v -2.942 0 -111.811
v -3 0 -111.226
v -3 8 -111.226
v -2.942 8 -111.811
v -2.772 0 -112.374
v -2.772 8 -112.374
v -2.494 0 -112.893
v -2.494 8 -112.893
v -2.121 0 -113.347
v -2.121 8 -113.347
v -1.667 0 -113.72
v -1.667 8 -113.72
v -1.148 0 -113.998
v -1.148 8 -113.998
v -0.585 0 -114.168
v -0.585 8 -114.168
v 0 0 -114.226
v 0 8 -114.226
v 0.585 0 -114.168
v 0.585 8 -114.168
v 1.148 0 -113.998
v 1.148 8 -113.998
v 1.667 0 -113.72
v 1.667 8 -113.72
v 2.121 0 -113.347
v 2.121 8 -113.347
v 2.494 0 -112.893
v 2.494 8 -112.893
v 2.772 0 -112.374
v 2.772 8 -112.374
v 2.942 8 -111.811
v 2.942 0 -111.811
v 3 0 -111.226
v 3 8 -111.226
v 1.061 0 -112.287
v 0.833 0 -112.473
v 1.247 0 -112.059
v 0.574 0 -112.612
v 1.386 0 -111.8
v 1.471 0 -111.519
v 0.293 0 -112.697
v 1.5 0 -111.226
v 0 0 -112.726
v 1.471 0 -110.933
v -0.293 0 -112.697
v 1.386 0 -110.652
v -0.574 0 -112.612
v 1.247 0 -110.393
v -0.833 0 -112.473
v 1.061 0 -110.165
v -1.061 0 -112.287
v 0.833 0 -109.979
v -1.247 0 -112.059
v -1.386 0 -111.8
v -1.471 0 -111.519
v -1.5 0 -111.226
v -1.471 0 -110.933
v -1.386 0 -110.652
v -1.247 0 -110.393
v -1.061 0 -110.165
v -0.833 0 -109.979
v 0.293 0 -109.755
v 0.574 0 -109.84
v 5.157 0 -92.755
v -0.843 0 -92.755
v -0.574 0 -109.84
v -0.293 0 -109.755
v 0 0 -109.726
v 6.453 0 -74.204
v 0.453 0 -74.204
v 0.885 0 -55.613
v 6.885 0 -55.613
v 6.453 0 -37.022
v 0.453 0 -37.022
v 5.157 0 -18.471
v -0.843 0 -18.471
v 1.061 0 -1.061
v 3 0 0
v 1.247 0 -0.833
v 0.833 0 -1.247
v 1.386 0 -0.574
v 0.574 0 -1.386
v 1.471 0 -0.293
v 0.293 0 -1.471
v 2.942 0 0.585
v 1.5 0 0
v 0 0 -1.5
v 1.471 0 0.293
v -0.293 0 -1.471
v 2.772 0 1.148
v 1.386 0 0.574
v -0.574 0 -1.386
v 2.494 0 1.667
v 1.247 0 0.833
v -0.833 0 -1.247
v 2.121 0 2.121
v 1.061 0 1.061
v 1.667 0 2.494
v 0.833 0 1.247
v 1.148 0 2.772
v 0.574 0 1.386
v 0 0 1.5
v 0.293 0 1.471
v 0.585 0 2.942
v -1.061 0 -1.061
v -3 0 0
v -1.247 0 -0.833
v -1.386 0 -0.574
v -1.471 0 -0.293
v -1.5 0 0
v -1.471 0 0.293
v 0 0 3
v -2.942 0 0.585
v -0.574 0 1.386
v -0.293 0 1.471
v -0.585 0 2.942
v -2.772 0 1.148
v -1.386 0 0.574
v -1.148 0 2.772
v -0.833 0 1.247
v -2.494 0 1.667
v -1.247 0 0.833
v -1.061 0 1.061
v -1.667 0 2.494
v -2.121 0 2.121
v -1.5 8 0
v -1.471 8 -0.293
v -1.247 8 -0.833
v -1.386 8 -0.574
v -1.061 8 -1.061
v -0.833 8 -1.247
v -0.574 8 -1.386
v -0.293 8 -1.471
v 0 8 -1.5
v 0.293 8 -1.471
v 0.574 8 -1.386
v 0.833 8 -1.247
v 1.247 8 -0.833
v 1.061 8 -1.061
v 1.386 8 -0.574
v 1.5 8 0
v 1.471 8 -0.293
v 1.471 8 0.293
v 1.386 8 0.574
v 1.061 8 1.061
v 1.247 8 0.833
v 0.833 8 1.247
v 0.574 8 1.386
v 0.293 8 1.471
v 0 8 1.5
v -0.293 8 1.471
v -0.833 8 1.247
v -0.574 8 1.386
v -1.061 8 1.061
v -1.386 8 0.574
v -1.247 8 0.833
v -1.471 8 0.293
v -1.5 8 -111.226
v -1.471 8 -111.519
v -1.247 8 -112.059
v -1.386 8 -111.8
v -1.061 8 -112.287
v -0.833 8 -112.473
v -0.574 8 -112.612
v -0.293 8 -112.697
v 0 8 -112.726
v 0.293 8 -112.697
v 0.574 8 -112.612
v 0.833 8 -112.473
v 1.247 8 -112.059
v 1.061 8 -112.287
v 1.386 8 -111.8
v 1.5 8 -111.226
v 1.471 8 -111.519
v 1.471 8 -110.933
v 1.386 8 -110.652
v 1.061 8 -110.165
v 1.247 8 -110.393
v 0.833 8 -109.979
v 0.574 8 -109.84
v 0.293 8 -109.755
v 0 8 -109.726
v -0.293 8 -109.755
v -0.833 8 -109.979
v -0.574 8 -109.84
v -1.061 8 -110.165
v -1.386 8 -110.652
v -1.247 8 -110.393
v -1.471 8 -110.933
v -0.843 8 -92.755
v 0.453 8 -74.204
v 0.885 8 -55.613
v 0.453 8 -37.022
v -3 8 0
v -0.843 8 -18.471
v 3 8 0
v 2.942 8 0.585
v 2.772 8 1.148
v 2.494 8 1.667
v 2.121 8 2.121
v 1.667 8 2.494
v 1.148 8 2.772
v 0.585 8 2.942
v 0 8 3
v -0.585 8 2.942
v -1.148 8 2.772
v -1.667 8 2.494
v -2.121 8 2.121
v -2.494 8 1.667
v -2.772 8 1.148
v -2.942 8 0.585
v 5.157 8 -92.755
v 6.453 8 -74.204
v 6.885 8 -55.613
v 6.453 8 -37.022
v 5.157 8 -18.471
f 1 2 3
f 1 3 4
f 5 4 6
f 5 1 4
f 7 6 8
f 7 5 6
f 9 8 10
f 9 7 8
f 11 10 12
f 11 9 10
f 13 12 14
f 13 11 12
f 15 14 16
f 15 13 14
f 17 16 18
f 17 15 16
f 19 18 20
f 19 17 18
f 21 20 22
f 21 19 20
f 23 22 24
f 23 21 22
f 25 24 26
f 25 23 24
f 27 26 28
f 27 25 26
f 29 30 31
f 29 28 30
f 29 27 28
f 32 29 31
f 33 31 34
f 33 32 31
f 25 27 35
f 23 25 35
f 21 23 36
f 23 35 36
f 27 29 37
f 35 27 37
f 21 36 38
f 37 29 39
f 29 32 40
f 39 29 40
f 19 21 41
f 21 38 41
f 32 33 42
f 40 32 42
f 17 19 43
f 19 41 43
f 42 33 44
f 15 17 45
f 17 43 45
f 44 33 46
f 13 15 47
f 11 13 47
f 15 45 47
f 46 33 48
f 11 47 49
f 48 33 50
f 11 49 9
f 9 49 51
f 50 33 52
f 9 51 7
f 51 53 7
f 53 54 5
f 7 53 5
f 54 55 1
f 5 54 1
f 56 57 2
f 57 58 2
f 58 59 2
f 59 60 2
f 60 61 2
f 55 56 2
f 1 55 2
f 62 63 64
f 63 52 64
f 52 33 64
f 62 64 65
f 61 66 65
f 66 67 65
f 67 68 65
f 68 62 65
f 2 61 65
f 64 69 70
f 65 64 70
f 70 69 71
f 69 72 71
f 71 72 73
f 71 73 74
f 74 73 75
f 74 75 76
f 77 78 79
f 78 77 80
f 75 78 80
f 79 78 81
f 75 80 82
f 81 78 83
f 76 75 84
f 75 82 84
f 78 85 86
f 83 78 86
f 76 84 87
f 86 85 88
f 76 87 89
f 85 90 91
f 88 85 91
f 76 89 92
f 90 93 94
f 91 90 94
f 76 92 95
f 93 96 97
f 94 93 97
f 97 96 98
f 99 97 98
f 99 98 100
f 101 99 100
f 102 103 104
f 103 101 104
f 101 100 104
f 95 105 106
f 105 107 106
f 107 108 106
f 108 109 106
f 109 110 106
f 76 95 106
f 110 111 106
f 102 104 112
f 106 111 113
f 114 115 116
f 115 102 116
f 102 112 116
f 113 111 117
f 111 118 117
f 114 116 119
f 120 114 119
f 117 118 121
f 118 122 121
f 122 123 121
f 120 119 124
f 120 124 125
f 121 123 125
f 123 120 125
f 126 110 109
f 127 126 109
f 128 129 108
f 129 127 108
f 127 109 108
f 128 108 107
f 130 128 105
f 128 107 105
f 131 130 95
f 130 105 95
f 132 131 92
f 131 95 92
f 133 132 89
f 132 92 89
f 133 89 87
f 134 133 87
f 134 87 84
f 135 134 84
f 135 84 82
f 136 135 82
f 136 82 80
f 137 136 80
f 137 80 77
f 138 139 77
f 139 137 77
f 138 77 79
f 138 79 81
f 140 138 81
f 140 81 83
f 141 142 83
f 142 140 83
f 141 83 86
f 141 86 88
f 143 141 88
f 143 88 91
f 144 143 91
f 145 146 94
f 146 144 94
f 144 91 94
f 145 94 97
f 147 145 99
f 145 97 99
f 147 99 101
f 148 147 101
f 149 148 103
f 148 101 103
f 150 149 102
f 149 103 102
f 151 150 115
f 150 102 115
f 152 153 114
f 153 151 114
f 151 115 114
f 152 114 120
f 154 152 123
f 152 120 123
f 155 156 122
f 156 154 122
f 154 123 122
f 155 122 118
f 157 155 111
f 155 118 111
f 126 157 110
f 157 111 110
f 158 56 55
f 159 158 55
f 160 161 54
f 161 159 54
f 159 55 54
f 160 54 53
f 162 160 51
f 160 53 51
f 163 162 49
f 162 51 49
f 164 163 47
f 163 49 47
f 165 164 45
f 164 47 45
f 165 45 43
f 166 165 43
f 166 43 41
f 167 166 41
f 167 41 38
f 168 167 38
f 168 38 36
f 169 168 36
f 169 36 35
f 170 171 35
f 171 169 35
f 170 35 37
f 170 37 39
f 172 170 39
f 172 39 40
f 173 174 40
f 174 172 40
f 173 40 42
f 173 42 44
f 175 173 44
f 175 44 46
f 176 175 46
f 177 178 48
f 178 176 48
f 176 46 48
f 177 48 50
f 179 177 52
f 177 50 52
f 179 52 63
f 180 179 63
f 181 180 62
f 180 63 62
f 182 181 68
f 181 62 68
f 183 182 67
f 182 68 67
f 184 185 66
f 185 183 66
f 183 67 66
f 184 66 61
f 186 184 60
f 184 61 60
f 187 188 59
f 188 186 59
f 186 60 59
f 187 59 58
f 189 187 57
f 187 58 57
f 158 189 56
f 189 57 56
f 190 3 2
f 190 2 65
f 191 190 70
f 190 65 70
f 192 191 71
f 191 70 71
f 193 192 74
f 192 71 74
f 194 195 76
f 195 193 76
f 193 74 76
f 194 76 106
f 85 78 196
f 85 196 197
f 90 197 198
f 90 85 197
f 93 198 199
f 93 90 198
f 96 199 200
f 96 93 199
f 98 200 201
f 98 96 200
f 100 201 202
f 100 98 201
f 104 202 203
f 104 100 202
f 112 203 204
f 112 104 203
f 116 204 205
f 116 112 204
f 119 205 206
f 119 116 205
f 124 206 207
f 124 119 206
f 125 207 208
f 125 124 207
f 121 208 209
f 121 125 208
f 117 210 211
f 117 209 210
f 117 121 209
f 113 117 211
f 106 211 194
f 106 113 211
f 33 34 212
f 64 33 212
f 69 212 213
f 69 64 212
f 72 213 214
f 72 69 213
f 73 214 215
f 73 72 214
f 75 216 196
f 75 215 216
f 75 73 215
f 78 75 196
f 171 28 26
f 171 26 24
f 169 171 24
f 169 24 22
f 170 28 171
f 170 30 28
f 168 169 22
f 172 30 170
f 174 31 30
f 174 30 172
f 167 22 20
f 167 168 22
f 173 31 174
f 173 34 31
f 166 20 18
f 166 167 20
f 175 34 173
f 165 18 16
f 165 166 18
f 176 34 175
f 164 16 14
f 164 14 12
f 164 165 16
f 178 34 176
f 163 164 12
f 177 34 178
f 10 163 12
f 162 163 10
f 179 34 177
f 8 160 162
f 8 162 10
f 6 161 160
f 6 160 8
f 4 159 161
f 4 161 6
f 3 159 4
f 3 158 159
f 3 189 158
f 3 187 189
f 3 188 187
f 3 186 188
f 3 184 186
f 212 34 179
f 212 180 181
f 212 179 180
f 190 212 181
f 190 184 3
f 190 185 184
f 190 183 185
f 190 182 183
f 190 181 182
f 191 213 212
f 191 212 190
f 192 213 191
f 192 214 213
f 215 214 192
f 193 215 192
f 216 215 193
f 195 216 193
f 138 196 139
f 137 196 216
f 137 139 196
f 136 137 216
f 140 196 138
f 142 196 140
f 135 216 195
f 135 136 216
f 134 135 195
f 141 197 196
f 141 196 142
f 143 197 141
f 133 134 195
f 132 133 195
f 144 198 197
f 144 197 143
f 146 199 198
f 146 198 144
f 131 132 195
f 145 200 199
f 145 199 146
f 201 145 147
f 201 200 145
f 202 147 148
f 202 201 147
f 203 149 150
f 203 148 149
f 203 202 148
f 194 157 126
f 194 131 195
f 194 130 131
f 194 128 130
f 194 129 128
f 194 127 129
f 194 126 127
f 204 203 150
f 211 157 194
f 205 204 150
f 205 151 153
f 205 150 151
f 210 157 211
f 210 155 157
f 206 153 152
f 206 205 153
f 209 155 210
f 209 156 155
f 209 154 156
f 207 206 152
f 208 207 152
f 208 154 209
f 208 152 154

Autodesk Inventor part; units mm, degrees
ref_plane "YZ Plane" through (0, 0, 0) normal (1, 0, 0) x (0, 1, 0)
ref_plane "XZ Plane" through (0, 0, 0) normal (0, 1, 0) x (-1, 0, 0)
ref_plane "XY Plane" through (0, 0, 0) normal (0, 0, 1) x (1, 0, 0)
sketch "Sketch1" plane through (0, 0, 0) normal (0, 1, 0) x (-1, 0, 0)
  line L0 (0, 0) -> (0, -111.226) construction
  line L1 (-3, 0) -> (-3, -111.226)
  line L2 (3, -111.226) -> (3, 0)
  arc A0 (3, 0) -> (-3, 0) centre (0, 0) ccw
  arc A1 (-3, -111.226) -> (3, -111.226) centre (0, -111.226) ccw
  circle A2 centre (0, 0) radius 1.5
  circle A3 centre (0, -111.226) radius 1.5
  arc A4 (3, 0) -> (3, -111.226) centre (399.1151, -55.613) ccw
  arc A5 (-3, 0) -> (-3, -111.226) centre (393.1151, -55.613) ccw
  point P0 (0, -55.613)
  dimension "d0" = 111.226
  dimension "d1" = 6
  dimension "d2" = 3
  dimension "d3" = 3
  dimension "d10" = 400
  dimension "d11" = 400
extrude "Extrusion1" add sketch "Sketch1" along normal blind 8 contours A0 A4 A1 L1 | L1 A5
sketch "Sketch2" plane through (0, 0, 0) normal (0, -1, 0) x (1, 0, 0)
  arc A0 (3, 0) -> (-3, 0) centre (0, 0) ccw projected
  arc A1 (-3, -111.226) -> (-3, 0) centre (-399.1151, -55.613) ccw projected
  arc A2 (-3, -111.226) -> (3, -111.226) centre (0, -111.226) ccw projected
  arc A3 (3, -111.226) -> (3, 0) centre (-393.1151, -55.613) ccw projected
  circle A4 centre (0, -111.226) radius 1.5 projected
  circle A5 centre (0, 0) radius 1.5 projected
